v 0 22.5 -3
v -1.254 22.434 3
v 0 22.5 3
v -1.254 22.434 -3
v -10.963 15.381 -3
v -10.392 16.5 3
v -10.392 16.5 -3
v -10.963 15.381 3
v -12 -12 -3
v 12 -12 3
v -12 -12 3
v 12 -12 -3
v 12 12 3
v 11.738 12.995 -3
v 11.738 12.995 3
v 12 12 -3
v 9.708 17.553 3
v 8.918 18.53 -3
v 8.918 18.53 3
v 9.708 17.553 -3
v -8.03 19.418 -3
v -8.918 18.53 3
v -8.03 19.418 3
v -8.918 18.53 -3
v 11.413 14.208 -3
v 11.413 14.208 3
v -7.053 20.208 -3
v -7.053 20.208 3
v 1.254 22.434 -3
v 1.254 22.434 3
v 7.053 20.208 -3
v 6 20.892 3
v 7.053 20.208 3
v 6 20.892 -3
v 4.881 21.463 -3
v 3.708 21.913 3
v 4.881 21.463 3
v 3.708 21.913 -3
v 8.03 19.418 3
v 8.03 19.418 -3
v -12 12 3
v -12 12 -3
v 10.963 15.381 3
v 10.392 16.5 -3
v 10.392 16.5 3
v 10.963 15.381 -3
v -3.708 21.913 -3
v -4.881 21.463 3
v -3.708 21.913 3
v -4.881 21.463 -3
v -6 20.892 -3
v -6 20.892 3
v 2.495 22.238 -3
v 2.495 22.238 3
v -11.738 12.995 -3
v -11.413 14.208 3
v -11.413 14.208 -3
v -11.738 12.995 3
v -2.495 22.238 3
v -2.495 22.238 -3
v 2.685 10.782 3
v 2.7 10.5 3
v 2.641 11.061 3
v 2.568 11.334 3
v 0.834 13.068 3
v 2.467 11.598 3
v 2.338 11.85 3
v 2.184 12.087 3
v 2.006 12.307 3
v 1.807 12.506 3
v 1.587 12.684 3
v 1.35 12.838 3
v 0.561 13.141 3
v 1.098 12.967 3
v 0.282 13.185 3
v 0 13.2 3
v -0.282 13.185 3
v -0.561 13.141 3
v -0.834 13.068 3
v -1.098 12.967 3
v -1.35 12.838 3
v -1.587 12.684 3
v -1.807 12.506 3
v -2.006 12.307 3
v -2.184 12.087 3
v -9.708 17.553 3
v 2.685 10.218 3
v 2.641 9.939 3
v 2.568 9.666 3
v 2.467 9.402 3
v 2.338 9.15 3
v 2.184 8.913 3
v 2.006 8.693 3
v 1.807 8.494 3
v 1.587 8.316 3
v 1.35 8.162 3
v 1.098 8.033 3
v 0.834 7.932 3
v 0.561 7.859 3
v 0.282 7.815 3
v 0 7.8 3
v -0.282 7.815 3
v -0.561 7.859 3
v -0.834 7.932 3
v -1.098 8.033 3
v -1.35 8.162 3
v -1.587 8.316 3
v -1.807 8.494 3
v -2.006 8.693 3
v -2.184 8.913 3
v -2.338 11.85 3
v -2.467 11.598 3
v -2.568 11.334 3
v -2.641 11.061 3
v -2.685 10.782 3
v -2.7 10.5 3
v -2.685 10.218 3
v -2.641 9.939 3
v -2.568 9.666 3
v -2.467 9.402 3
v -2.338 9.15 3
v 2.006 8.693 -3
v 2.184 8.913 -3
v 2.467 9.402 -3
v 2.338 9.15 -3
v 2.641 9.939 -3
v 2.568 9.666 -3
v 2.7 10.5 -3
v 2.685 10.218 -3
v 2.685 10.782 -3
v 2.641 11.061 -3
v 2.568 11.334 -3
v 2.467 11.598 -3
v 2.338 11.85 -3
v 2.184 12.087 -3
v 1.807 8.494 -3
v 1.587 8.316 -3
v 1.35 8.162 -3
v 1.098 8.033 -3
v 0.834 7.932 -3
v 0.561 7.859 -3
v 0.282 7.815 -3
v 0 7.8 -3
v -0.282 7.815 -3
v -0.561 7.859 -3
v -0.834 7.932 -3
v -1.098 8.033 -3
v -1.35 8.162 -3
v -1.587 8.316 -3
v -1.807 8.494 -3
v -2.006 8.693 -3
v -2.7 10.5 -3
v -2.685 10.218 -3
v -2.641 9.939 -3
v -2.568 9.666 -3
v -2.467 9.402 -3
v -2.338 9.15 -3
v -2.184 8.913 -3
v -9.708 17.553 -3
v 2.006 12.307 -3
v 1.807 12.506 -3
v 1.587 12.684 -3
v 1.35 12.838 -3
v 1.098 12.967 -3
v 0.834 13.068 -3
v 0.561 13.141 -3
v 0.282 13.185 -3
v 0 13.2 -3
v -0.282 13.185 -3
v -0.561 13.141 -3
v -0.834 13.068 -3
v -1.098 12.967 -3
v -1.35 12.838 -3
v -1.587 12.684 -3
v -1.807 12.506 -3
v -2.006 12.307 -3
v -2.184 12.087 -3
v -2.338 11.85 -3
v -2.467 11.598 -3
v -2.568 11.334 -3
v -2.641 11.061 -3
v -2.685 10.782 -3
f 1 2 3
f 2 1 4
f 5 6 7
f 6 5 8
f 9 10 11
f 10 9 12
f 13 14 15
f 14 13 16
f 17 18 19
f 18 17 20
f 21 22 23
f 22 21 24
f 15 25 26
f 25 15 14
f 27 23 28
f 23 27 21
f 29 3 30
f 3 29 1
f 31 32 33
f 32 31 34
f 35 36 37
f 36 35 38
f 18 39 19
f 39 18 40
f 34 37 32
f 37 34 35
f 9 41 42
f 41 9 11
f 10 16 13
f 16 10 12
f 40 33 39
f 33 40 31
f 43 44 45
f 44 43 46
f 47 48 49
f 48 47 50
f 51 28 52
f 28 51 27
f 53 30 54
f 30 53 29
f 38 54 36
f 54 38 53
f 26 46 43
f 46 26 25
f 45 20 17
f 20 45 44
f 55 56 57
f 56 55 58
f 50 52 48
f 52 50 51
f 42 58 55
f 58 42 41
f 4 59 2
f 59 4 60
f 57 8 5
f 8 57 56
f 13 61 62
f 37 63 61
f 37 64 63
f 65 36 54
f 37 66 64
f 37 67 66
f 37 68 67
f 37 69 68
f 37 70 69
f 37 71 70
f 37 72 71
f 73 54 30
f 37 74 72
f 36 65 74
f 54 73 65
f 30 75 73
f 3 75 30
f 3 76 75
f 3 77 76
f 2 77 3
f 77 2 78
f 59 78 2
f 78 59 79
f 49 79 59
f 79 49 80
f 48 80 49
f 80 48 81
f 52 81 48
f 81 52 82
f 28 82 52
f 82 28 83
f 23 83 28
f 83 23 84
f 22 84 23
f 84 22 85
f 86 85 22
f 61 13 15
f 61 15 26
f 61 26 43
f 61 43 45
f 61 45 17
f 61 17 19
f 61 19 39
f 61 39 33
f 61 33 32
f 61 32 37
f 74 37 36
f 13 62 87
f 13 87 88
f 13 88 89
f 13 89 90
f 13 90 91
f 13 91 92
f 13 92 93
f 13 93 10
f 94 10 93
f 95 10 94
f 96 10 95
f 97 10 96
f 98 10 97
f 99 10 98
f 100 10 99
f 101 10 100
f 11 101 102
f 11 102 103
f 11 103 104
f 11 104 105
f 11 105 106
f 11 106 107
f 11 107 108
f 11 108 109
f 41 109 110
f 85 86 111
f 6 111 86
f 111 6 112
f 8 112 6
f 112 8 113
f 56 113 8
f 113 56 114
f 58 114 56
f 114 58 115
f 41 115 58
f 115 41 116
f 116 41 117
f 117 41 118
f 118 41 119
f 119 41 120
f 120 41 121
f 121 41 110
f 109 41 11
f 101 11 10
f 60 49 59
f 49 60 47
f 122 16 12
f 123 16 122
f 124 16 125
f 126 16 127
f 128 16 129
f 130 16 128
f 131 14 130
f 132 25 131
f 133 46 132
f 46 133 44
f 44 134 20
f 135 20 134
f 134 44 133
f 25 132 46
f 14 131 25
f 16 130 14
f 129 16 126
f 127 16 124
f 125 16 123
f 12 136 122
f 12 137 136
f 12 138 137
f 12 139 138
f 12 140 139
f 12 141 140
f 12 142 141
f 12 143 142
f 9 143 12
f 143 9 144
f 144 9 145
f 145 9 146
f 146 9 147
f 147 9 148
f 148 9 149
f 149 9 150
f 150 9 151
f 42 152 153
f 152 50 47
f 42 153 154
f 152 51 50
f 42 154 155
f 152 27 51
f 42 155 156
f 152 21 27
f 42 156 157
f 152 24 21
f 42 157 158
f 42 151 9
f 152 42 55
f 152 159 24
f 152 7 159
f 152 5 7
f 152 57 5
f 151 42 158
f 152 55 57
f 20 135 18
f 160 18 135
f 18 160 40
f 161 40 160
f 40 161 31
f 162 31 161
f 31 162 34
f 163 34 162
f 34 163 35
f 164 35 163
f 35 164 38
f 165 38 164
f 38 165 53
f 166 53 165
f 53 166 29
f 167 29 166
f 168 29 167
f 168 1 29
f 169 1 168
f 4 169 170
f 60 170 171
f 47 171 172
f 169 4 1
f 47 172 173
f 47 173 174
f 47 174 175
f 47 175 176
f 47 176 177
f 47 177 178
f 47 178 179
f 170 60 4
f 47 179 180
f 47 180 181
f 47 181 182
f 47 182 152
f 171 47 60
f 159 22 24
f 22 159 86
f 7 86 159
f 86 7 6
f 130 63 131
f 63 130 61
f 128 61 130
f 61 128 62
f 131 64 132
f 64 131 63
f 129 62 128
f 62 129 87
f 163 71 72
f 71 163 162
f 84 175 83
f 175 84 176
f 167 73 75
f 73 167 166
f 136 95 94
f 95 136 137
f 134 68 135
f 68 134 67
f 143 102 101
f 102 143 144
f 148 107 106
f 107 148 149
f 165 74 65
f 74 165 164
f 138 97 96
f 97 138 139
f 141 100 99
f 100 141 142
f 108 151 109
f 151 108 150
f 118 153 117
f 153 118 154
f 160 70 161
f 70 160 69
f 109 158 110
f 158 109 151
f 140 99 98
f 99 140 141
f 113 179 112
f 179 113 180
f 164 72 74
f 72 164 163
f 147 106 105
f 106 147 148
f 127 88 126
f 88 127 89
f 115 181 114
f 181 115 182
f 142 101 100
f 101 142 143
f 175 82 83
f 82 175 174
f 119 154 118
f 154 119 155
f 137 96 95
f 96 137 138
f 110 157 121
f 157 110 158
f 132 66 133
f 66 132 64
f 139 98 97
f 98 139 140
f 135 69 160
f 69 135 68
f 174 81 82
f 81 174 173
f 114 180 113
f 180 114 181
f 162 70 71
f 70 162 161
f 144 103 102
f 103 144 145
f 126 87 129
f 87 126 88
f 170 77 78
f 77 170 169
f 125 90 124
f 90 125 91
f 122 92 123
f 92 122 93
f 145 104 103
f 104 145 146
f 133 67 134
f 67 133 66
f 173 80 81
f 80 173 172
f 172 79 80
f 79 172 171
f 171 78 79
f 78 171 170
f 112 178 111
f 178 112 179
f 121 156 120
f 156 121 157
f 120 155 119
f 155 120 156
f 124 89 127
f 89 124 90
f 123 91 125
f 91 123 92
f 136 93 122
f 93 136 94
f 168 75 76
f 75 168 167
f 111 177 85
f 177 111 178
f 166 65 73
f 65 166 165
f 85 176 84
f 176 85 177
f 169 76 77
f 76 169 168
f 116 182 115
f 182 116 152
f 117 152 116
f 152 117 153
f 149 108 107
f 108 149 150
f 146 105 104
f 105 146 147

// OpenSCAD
// Single-hole mounting tab.
$fn = 60;
eps = 0.02;
tab_w = 24;
tab_h = 45;
tab_t = 6;
hole_d = 5.4;
difference() {
    hull() {
        translate([0, 0, 0]) cube([tab_w, tab_w, tab_t], center = true);
        translate([0, tab_h / 2 - tab_w / 2, 0]) cylinder(d = tab_w, h = tab_t, center = true);
    }
    translate([0, tab_h / 2 - tab_w / 2, -tab_t / 2 - eps]) cylinder(d = hole_d, h = tab_t + 2 * eps);
}
